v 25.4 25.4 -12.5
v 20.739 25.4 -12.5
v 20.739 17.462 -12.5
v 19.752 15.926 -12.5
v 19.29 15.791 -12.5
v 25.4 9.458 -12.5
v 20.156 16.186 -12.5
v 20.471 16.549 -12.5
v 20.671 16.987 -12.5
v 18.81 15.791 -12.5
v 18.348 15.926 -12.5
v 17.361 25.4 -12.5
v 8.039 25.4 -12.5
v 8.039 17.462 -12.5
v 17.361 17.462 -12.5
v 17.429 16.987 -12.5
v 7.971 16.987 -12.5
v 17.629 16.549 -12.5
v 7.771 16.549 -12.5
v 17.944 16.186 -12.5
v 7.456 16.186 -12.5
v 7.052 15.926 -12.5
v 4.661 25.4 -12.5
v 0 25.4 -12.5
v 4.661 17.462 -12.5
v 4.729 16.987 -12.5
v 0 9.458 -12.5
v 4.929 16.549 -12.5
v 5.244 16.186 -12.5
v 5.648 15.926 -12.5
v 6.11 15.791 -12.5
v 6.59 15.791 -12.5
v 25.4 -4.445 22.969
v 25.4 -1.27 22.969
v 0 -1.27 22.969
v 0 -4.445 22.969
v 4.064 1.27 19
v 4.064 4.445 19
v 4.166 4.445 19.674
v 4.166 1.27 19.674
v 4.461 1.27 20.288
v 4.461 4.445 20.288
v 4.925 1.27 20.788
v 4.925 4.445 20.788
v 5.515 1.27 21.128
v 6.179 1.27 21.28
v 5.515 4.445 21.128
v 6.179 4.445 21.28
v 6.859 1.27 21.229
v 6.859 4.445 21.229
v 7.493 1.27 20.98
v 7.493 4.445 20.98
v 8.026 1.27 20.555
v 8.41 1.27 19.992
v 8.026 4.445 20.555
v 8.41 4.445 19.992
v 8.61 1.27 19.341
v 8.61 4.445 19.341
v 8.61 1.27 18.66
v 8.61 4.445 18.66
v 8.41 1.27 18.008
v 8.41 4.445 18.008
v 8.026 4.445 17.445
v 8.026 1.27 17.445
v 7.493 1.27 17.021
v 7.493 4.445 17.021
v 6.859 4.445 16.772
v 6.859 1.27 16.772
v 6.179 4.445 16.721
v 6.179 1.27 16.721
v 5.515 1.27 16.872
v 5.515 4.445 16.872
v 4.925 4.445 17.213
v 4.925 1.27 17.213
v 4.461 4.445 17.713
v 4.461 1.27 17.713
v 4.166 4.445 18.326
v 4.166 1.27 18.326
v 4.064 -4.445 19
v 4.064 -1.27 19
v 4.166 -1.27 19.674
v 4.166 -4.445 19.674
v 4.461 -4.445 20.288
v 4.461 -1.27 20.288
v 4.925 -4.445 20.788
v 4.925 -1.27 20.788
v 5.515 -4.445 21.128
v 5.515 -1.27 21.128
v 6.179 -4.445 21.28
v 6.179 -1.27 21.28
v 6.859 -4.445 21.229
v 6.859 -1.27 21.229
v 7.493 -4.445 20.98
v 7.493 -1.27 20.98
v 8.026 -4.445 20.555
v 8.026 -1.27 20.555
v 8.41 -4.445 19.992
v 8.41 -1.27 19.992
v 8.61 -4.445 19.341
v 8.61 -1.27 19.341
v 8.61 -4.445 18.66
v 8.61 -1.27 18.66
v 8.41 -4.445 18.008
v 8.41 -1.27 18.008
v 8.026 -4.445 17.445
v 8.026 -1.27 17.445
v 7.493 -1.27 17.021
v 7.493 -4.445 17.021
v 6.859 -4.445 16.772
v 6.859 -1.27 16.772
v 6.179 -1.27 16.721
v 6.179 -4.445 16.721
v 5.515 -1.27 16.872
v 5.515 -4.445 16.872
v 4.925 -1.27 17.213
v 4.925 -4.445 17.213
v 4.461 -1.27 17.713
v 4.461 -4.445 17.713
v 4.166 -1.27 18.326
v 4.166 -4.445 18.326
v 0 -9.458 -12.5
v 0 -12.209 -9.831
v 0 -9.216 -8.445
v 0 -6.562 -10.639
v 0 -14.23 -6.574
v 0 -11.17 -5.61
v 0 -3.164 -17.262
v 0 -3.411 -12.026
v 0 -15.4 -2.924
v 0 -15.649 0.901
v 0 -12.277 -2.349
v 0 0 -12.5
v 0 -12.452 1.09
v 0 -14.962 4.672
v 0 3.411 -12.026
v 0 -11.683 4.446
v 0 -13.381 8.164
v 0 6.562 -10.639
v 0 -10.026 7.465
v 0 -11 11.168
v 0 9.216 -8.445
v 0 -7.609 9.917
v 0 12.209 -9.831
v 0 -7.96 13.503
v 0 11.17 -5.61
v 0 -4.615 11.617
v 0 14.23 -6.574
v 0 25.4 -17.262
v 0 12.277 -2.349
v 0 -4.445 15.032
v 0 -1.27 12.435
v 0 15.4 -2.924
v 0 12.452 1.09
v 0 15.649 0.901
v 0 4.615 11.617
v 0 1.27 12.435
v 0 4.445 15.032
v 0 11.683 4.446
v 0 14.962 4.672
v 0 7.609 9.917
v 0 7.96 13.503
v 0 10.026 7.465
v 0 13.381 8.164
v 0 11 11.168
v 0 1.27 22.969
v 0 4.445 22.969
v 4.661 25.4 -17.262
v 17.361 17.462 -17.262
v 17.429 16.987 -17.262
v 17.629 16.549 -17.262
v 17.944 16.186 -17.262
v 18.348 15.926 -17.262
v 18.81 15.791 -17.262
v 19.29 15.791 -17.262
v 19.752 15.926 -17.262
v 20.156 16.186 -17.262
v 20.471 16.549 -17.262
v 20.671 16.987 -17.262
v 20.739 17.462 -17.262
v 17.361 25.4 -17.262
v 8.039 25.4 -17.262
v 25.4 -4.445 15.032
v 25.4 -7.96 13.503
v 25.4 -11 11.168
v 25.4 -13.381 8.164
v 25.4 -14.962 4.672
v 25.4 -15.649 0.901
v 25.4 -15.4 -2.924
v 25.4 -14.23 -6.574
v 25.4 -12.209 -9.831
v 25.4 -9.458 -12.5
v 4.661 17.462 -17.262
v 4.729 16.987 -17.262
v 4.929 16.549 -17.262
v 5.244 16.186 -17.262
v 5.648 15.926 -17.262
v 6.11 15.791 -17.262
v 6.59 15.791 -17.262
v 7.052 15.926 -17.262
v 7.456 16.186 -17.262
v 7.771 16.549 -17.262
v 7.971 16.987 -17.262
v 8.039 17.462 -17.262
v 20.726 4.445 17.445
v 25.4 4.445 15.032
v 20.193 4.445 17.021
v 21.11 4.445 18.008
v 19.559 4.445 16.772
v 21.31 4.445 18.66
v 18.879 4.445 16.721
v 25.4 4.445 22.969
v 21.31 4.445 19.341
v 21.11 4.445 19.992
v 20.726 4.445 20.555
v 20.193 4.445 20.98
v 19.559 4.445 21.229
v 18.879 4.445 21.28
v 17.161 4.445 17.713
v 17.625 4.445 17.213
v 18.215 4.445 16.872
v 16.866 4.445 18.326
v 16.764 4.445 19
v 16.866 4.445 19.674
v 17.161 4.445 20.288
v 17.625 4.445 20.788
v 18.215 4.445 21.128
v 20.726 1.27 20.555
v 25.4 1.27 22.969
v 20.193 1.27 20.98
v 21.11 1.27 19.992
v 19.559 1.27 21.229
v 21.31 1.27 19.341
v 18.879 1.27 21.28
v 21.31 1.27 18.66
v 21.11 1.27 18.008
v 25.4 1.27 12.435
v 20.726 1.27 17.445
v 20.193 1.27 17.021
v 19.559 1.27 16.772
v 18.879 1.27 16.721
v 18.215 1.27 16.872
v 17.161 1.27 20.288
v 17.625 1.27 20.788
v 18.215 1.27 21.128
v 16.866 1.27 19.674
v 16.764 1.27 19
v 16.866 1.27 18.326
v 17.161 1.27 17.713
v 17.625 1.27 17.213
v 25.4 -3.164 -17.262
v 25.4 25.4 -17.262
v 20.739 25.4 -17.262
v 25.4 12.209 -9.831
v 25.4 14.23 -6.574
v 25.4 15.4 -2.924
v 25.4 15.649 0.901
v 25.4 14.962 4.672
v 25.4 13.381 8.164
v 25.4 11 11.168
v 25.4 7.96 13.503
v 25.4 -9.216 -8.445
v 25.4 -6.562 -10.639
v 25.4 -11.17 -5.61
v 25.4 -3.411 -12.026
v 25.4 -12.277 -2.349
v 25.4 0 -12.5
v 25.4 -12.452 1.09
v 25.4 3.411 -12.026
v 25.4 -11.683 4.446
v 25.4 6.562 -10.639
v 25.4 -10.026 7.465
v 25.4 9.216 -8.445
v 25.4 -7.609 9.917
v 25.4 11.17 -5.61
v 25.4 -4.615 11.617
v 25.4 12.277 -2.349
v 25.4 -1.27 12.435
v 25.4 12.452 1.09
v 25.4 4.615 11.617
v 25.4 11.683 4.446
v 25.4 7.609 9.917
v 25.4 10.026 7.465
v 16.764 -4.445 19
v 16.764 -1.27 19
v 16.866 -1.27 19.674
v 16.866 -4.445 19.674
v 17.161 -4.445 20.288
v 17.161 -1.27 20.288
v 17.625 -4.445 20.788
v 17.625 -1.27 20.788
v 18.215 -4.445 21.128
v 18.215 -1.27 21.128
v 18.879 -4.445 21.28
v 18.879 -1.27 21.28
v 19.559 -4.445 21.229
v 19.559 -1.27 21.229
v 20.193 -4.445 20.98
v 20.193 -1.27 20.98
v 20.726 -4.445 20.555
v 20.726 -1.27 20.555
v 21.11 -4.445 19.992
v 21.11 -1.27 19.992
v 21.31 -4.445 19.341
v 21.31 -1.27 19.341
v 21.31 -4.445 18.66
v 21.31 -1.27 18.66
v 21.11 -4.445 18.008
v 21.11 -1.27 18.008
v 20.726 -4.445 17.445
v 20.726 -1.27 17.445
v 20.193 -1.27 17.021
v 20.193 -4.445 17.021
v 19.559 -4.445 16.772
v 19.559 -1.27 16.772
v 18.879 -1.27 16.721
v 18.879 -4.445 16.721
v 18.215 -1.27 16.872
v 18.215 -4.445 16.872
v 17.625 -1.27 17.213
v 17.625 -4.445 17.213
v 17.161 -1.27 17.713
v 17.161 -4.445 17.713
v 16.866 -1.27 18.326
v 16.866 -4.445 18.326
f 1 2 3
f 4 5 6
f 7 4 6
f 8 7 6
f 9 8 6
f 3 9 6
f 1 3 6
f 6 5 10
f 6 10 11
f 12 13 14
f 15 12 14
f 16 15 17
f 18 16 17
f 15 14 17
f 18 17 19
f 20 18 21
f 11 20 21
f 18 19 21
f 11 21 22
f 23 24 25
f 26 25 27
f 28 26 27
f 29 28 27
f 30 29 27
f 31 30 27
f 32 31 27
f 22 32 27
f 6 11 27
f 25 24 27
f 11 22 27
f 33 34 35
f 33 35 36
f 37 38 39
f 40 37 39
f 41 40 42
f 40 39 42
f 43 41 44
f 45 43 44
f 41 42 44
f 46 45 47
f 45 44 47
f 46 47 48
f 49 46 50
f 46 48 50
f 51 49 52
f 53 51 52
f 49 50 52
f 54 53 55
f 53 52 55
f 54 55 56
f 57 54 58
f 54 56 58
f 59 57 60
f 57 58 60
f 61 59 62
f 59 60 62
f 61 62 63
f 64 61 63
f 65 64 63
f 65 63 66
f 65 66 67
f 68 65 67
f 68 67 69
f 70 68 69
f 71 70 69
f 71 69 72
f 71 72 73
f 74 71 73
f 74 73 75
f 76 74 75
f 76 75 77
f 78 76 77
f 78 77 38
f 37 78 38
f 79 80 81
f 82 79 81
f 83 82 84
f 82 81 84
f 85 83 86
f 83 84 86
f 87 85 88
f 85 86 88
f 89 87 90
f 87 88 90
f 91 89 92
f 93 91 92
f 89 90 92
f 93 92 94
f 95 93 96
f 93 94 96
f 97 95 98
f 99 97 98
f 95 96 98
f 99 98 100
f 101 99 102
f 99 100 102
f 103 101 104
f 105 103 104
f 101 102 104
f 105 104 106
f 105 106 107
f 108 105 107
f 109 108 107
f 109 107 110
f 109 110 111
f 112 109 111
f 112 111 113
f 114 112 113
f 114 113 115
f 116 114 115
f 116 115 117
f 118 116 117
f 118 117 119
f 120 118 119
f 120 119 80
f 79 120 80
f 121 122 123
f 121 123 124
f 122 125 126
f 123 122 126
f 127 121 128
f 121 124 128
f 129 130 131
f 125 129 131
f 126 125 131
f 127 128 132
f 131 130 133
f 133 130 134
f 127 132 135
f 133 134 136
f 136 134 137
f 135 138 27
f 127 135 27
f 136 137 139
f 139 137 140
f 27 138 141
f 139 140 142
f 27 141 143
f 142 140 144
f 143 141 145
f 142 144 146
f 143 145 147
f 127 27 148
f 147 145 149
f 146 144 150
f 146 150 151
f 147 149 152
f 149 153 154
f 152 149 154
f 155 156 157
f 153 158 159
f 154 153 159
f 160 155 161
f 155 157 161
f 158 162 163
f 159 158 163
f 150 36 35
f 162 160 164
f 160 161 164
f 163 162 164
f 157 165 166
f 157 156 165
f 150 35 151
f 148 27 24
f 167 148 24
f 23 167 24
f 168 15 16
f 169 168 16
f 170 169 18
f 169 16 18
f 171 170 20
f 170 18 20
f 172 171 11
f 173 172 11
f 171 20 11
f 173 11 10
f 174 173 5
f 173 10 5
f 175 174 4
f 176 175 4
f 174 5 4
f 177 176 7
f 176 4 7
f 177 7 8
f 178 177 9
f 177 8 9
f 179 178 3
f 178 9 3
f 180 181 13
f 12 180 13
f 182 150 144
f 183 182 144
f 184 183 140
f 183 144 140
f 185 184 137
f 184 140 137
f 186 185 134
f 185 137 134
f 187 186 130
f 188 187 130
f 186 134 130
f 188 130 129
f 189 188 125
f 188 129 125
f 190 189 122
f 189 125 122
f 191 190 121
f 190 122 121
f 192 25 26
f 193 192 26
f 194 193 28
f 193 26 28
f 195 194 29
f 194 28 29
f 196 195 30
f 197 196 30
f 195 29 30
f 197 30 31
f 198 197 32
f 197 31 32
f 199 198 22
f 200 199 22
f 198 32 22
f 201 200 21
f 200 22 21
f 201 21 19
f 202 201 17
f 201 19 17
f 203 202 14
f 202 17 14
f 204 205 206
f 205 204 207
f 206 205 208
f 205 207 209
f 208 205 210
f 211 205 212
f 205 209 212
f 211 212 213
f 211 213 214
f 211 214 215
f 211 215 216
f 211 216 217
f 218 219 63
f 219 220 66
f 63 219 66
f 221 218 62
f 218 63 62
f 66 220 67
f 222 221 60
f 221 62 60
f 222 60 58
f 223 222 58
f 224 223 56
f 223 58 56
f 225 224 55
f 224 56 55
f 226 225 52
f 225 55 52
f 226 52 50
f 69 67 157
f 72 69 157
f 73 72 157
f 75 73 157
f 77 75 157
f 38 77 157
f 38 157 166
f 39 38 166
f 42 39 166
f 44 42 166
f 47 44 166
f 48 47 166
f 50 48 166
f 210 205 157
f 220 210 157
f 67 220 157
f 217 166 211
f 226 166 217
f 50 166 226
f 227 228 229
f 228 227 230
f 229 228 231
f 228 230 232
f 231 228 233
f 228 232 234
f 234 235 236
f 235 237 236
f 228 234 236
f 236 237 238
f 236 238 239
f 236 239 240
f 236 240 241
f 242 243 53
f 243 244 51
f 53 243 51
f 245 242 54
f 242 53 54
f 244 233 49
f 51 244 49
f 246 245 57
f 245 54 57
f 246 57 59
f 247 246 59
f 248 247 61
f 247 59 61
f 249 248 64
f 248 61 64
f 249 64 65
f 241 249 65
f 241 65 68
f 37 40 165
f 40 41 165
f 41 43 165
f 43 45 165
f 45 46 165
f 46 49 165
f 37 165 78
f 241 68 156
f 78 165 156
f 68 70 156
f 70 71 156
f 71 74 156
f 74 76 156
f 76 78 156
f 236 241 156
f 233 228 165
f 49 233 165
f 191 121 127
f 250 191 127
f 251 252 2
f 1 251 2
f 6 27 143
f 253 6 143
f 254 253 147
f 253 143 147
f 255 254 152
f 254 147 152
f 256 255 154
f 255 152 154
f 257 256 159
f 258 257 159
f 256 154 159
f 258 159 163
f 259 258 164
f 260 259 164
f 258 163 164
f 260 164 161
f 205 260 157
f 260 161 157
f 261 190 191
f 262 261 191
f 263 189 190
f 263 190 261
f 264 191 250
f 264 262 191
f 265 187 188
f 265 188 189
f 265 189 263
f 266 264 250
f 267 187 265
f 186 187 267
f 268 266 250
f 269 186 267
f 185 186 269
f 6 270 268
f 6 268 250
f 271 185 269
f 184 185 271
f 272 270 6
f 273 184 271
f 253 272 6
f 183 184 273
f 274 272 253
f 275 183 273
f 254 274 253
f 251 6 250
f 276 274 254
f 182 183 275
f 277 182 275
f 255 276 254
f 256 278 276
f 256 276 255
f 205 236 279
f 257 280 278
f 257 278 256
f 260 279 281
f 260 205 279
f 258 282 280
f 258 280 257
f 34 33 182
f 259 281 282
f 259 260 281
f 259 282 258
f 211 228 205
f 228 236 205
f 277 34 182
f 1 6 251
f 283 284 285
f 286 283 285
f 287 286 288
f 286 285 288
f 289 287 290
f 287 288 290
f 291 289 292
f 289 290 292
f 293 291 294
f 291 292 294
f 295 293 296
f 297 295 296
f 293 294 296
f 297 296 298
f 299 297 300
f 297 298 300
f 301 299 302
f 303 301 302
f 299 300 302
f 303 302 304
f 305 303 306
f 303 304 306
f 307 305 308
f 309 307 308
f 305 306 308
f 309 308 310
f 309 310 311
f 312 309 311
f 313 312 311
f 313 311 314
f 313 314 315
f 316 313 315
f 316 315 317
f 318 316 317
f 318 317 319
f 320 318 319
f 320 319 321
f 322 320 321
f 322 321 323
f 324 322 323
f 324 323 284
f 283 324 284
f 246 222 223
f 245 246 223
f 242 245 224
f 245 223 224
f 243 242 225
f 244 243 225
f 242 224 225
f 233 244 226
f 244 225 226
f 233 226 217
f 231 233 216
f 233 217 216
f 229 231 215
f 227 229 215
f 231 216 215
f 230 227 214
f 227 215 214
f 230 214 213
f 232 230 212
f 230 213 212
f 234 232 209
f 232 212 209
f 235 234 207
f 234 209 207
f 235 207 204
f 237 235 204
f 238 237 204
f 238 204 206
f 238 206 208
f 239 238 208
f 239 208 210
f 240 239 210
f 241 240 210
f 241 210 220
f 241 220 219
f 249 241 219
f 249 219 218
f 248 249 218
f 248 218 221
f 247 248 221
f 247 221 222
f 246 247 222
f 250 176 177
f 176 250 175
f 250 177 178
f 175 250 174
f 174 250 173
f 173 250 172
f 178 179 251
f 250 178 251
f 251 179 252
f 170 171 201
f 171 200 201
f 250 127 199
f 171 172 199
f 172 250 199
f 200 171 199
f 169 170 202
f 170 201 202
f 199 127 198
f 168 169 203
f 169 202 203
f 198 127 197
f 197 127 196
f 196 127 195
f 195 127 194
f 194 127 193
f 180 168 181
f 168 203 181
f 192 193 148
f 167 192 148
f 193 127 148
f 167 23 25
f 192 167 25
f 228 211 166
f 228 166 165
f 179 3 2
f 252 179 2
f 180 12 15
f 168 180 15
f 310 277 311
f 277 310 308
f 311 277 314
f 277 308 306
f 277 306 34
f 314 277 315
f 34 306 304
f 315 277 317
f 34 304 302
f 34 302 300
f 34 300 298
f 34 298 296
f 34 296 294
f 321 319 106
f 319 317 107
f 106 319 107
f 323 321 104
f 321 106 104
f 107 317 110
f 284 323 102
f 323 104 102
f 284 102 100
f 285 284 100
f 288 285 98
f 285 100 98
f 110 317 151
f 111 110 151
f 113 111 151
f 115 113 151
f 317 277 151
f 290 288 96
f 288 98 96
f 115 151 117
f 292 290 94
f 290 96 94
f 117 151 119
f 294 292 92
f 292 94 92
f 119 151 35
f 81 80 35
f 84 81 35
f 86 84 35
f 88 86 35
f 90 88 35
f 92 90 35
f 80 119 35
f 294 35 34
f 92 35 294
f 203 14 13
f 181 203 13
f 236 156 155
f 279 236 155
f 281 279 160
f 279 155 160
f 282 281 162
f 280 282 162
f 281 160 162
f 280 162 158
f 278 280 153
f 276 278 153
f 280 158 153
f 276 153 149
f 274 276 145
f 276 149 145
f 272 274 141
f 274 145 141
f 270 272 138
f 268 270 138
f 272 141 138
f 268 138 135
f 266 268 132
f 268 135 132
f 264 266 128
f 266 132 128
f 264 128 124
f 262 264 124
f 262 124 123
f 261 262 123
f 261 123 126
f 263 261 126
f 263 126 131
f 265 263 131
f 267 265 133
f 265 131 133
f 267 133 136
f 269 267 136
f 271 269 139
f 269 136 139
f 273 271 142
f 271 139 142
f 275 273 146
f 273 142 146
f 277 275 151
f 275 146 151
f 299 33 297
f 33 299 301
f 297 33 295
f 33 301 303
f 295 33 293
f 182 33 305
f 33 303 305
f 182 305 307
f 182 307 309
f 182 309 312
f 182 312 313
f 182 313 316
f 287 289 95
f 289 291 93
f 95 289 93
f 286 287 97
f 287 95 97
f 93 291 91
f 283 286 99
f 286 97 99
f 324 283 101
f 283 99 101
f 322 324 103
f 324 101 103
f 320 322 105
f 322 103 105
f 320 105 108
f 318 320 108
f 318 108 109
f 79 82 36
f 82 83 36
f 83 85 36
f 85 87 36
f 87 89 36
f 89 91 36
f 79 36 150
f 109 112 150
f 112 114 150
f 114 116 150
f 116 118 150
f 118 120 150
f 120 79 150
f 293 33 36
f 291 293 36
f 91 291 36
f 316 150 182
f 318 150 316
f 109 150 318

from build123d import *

# Parameters (mm, degrees)
F1_DEPTH = 25.4
F3_DEPTH = 25.401
F5_DEPTH = 4.7625
F6_R     = 2.286
F7_DEPTH = 20.121


with BuildPart() as f1:
    # F0 (on Right) → F1 (new body)
    with BuildSketch(Plane.YZ):
        with BuildLine():
            ThreePointArc((1.27, 12.435317), (0, -12.5), (-1.27, 12.435317))
            Line((-1.27, 12.435317), (-1.27, 22.969053))
            Line((-1.27, 22.969053), (-4.445, 22.969053))
            Line((-4.445, 22.969053), (-4.445, 15.031553))
            ThreePointArc((-4.445, 15.031553), (-15.421435, 2.808021), (-9.458098, -12.5))
            Line((-9.458098, -12.5), (-25.4, -12.5))
            Line((-25.4, -12.5), (-25.4, -17.2625))
            Line((-25.4, -17.2625), (25.4, -17.2625))
            Line((25.4, -17.2625), (25.4, -12.5))
            Line((25.4, -12.5), (9.458098, -12.5))
            ThreePointArc((9.458098, -12.5), (15.421435, 2.808021), (4.445, 15.031553))
            Line((4.445, 15.031553), (4.445, 22.969053))
            Line((4.445, 22.969053), (1.27, 22.969053))
            Line((1.27, 22.969053), (1.27, 12.435317))
        make_face()
    extrude(amount=F1_DEPTH)

    # F2 (on face) → F3 (cut, through all)
    with BuildSketch(Plane(origin=(0, 0, 0), x_dir=(0, -1, 0), z_dir=(-1, 0, 0))):
        Polygon((25.4, -12.5), (9.458098, -12.5), (3.163889, -17.2625), (25.4, -17.2625), align=None)
    extrude(amount=-F3_DEPTH, mode=Mode.SUBTRACT)

    # F4 (on face) → F5 (cut, through all)
    with BuildSketch(Plane.XY.offset(-12.5)):
        with BuildLine():
            Line((4.6609, 25.4), (4.6609, 17.4625))
            ThreePointArc((4.6609, 17.4625), (6.35, 15.7734), (8.0391, 17.4625))
            Line((8.0391, 17.4625), (8.0391, 25.4))
            Line((8.0391, 25.4), (4.6609, 25.4))
        make_face()
        with BuildLine():
            Line((17.3609, 25.4), (17.3609, 17.4625))
            ThreePointArc((17.3609, 17.4625), (19.05, 15.7734), (20.7391, 17.4625))
            Line((20.7391, 17.4625), (20.7391, 25.4))
            Line((20.7391, 25.4), (17.3609, 25.4))
        make_face()
    extrude(amount=-F5_DEPTH, mode=Mode.SUBTRACT)

    # F6 (on face) → F7 (cut, through all)
    with BuildSketch(Plane(origin=(0, 4.445, 0), x_dir=(-1, 0, 0), z_dir=(0, 1, 0))):
        with Locations((-19.05, 19.000303)):
            Circle(F6_R)
        with Locations((-6.35, 19.000303)):
            Circle(F6_R)
    extrude(amount=-F7_DEPTH, mode=Mode.SUBTRACT)


solid = f1.part
